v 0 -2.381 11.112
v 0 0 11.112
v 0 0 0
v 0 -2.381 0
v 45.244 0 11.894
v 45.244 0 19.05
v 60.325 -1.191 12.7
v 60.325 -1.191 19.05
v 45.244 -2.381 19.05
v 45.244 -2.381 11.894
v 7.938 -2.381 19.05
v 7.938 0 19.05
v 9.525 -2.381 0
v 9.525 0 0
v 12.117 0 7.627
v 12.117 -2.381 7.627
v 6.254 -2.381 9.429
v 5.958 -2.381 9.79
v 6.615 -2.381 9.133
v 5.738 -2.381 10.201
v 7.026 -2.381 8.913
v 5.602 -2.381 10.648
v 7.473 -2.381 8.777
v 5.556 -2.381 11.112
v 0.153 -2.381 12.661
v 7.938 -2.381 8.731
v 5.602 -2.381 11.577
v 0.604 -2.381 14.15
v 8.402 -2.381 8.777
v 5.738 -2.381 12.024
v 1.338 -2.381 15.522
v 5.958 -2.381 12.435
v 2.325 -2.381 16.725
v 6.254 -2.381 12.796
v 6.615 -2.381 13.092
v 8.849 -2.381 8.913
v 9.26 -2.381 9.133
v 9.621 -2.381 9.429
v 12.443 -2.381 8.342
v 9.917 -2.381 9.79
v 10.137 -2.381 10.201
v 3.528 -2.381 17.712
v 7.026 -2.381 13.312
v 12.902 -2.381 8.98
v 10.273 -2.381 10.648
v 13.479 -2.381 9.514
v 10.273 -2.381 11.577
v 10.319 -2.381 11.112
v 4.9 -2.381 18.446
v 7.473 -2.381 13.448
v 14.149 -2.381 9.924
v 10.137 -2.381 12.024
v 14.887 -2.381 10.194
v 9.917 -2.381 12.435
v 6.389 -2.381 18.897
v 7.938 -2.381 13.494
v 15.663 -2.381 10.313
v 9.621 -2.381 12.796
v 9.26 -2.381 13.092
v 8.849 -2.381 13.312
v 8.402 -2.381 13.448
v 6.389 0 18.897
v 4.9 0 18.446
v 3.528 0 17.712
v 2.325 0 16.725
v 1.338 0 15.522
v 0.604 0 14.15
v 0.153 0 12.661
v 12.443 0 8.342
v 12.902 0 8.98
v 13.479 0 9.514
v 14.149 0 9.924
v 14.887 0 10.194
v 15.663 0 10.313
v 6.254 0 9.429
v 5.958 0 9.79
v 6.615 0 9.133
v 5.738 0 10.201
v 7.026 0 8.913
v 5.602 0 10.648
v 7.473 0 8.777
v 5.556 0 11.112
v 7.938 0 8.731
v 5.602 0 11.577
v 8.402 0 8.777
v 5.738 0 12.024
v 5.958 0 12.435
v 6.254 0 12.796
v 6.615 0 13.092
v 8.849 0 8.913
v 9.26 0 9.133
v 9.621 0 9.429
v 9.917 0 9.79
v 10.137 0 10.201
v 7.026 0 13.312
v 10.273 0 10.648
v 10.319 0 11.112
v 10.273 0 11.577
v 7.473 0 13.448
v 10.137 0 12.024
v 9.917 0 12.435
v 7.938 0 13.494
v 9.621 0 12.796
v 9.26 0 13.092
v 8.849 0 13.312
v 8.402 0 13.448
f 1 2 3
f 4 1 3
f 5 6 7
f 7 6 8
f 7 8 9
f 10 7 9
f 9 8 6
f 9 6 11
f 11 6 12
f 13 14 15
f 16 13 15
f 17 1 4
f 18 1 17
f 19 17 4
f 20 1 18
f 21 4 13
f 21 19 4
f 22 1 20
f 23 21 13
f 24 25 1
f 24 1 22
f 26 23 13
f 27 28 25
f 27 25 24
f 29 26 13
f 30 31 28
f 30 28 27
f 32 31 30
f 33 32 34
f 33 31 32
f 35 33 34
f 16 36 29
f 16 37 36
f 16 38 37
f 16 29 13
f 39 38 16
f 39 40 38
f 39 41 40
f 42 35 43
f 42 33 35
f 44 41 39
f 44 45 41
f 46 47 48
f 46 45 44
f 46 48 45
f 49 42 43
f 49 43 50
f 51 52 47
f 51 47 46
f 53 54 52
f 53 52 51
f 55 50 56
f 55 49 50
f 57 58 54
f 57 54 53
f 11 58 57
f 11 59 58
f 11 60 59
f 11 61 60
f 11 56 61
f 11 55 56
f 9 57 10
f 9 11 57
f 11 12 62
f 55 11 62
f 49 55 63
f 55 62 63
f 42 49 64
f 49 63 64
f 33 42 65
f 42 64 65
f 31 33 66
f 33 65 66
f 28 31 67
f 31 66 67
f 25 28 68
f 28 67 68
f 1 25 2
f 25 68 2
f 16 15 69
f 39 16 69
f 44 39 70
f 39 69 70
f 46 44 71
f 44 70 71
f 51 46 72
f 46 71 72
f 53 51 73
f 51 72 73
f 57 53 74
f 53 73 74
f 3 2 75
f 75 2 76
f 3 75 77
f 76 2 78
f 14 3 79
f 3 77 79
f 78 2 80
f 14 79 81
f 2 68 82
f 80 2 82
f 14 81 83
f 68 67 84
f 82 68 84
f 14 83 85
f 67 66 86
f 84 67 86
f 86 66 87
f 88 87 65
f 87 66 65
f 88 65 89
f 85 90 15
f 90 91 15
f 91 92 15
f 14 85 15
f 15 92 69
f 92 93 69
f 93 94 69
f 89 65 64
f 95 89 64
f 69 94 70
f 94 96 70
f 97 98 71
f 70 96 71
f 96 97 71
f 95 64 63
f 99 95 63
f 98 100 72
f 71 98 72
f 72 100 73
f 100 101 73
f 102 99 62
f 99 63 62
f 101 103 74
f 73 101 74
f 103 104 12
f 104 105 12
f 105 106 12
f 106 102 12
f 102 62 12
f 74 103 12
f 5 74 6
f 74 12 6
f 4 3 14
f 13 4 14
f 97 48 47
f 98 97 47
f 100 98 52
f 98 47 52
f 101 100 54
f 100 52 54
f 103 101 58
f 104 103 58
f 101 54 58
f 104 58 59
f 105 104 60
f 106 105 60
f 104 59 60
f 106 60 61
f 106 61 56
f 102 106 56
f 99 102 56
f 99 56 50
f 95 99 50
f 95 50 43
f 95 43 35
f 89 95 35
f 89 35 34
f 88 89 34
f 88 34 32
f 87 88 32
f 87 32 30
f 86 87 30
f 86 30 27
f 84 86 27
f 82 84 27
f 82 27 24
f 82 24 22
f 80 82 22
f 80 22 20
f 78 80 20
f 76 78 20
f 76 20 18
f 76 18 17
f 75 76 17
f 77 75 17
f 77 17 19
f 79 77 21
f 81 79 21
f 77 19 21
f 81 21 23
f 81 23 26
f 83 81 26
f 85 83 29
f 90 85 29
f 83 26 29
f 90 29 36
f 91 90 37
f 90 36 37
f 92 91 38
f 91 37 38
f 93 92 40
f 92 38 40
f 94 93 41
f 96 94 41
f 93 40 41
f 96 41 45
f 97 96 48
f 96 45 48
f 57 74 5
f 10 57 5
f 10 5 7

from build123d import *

# Parameters (mm, degrees)
F1_DEPTH = 2.38125
F2_R     = 2.38125
F3_DEPTH = 25.4
F5_DEPTH = 25.4


with BuildPart() as f1:
    # F0 (on Front) → F1 (new body)
    with BuildSketch(Plane.XZ):
        with BuildLine():
            Line((60.325, 19.05), (7.9375, 19.05))
            ThreePointArc((7.9375, 19.05), (2.32484, 16.72516), (0, 11.1125))
            Line((0, 11.1125), (0, 0))
            Line((0, 0), (9.525, 0))
            Line((9.525, 0), (12.117365, 7.627166))
            ThreePointArc((12.117365, 7.627166), (13.478615, 9.513592), (15.663196, 10.313094))
            Line((15.663196, 10.313094), (60.325, 12.7))
            Line((60.325, 12.7), (60.325, 19.05))
        make_face()
    extrude(amount=F1_DEPTH)

    # F2 (on face) → F3 (cut)
    with BuildSketch(Plane.XZ.offset(2.38125)):
        with Locations((7.9375, 11.1125)):
            Circle(F2_R)
    extrude(amount=-F3_DEPTH, mode=Mode.SUBTRACT)

    # F4 (on face) → F5 (cut)
    with BuildSketch(Plane.XY.offset(19.05)):
        Polygon((60.325, -2.38125), (60.325, -1.190625), (45.24375, -2.38125), align=None)
        Polygon((60.325, 0), (45.24375, 0), (60.325, -1.190625), align=None)
    extrude(amount=-F5_DEPTH, mode=Mode.SUBTRACT)


solid = f1.part
